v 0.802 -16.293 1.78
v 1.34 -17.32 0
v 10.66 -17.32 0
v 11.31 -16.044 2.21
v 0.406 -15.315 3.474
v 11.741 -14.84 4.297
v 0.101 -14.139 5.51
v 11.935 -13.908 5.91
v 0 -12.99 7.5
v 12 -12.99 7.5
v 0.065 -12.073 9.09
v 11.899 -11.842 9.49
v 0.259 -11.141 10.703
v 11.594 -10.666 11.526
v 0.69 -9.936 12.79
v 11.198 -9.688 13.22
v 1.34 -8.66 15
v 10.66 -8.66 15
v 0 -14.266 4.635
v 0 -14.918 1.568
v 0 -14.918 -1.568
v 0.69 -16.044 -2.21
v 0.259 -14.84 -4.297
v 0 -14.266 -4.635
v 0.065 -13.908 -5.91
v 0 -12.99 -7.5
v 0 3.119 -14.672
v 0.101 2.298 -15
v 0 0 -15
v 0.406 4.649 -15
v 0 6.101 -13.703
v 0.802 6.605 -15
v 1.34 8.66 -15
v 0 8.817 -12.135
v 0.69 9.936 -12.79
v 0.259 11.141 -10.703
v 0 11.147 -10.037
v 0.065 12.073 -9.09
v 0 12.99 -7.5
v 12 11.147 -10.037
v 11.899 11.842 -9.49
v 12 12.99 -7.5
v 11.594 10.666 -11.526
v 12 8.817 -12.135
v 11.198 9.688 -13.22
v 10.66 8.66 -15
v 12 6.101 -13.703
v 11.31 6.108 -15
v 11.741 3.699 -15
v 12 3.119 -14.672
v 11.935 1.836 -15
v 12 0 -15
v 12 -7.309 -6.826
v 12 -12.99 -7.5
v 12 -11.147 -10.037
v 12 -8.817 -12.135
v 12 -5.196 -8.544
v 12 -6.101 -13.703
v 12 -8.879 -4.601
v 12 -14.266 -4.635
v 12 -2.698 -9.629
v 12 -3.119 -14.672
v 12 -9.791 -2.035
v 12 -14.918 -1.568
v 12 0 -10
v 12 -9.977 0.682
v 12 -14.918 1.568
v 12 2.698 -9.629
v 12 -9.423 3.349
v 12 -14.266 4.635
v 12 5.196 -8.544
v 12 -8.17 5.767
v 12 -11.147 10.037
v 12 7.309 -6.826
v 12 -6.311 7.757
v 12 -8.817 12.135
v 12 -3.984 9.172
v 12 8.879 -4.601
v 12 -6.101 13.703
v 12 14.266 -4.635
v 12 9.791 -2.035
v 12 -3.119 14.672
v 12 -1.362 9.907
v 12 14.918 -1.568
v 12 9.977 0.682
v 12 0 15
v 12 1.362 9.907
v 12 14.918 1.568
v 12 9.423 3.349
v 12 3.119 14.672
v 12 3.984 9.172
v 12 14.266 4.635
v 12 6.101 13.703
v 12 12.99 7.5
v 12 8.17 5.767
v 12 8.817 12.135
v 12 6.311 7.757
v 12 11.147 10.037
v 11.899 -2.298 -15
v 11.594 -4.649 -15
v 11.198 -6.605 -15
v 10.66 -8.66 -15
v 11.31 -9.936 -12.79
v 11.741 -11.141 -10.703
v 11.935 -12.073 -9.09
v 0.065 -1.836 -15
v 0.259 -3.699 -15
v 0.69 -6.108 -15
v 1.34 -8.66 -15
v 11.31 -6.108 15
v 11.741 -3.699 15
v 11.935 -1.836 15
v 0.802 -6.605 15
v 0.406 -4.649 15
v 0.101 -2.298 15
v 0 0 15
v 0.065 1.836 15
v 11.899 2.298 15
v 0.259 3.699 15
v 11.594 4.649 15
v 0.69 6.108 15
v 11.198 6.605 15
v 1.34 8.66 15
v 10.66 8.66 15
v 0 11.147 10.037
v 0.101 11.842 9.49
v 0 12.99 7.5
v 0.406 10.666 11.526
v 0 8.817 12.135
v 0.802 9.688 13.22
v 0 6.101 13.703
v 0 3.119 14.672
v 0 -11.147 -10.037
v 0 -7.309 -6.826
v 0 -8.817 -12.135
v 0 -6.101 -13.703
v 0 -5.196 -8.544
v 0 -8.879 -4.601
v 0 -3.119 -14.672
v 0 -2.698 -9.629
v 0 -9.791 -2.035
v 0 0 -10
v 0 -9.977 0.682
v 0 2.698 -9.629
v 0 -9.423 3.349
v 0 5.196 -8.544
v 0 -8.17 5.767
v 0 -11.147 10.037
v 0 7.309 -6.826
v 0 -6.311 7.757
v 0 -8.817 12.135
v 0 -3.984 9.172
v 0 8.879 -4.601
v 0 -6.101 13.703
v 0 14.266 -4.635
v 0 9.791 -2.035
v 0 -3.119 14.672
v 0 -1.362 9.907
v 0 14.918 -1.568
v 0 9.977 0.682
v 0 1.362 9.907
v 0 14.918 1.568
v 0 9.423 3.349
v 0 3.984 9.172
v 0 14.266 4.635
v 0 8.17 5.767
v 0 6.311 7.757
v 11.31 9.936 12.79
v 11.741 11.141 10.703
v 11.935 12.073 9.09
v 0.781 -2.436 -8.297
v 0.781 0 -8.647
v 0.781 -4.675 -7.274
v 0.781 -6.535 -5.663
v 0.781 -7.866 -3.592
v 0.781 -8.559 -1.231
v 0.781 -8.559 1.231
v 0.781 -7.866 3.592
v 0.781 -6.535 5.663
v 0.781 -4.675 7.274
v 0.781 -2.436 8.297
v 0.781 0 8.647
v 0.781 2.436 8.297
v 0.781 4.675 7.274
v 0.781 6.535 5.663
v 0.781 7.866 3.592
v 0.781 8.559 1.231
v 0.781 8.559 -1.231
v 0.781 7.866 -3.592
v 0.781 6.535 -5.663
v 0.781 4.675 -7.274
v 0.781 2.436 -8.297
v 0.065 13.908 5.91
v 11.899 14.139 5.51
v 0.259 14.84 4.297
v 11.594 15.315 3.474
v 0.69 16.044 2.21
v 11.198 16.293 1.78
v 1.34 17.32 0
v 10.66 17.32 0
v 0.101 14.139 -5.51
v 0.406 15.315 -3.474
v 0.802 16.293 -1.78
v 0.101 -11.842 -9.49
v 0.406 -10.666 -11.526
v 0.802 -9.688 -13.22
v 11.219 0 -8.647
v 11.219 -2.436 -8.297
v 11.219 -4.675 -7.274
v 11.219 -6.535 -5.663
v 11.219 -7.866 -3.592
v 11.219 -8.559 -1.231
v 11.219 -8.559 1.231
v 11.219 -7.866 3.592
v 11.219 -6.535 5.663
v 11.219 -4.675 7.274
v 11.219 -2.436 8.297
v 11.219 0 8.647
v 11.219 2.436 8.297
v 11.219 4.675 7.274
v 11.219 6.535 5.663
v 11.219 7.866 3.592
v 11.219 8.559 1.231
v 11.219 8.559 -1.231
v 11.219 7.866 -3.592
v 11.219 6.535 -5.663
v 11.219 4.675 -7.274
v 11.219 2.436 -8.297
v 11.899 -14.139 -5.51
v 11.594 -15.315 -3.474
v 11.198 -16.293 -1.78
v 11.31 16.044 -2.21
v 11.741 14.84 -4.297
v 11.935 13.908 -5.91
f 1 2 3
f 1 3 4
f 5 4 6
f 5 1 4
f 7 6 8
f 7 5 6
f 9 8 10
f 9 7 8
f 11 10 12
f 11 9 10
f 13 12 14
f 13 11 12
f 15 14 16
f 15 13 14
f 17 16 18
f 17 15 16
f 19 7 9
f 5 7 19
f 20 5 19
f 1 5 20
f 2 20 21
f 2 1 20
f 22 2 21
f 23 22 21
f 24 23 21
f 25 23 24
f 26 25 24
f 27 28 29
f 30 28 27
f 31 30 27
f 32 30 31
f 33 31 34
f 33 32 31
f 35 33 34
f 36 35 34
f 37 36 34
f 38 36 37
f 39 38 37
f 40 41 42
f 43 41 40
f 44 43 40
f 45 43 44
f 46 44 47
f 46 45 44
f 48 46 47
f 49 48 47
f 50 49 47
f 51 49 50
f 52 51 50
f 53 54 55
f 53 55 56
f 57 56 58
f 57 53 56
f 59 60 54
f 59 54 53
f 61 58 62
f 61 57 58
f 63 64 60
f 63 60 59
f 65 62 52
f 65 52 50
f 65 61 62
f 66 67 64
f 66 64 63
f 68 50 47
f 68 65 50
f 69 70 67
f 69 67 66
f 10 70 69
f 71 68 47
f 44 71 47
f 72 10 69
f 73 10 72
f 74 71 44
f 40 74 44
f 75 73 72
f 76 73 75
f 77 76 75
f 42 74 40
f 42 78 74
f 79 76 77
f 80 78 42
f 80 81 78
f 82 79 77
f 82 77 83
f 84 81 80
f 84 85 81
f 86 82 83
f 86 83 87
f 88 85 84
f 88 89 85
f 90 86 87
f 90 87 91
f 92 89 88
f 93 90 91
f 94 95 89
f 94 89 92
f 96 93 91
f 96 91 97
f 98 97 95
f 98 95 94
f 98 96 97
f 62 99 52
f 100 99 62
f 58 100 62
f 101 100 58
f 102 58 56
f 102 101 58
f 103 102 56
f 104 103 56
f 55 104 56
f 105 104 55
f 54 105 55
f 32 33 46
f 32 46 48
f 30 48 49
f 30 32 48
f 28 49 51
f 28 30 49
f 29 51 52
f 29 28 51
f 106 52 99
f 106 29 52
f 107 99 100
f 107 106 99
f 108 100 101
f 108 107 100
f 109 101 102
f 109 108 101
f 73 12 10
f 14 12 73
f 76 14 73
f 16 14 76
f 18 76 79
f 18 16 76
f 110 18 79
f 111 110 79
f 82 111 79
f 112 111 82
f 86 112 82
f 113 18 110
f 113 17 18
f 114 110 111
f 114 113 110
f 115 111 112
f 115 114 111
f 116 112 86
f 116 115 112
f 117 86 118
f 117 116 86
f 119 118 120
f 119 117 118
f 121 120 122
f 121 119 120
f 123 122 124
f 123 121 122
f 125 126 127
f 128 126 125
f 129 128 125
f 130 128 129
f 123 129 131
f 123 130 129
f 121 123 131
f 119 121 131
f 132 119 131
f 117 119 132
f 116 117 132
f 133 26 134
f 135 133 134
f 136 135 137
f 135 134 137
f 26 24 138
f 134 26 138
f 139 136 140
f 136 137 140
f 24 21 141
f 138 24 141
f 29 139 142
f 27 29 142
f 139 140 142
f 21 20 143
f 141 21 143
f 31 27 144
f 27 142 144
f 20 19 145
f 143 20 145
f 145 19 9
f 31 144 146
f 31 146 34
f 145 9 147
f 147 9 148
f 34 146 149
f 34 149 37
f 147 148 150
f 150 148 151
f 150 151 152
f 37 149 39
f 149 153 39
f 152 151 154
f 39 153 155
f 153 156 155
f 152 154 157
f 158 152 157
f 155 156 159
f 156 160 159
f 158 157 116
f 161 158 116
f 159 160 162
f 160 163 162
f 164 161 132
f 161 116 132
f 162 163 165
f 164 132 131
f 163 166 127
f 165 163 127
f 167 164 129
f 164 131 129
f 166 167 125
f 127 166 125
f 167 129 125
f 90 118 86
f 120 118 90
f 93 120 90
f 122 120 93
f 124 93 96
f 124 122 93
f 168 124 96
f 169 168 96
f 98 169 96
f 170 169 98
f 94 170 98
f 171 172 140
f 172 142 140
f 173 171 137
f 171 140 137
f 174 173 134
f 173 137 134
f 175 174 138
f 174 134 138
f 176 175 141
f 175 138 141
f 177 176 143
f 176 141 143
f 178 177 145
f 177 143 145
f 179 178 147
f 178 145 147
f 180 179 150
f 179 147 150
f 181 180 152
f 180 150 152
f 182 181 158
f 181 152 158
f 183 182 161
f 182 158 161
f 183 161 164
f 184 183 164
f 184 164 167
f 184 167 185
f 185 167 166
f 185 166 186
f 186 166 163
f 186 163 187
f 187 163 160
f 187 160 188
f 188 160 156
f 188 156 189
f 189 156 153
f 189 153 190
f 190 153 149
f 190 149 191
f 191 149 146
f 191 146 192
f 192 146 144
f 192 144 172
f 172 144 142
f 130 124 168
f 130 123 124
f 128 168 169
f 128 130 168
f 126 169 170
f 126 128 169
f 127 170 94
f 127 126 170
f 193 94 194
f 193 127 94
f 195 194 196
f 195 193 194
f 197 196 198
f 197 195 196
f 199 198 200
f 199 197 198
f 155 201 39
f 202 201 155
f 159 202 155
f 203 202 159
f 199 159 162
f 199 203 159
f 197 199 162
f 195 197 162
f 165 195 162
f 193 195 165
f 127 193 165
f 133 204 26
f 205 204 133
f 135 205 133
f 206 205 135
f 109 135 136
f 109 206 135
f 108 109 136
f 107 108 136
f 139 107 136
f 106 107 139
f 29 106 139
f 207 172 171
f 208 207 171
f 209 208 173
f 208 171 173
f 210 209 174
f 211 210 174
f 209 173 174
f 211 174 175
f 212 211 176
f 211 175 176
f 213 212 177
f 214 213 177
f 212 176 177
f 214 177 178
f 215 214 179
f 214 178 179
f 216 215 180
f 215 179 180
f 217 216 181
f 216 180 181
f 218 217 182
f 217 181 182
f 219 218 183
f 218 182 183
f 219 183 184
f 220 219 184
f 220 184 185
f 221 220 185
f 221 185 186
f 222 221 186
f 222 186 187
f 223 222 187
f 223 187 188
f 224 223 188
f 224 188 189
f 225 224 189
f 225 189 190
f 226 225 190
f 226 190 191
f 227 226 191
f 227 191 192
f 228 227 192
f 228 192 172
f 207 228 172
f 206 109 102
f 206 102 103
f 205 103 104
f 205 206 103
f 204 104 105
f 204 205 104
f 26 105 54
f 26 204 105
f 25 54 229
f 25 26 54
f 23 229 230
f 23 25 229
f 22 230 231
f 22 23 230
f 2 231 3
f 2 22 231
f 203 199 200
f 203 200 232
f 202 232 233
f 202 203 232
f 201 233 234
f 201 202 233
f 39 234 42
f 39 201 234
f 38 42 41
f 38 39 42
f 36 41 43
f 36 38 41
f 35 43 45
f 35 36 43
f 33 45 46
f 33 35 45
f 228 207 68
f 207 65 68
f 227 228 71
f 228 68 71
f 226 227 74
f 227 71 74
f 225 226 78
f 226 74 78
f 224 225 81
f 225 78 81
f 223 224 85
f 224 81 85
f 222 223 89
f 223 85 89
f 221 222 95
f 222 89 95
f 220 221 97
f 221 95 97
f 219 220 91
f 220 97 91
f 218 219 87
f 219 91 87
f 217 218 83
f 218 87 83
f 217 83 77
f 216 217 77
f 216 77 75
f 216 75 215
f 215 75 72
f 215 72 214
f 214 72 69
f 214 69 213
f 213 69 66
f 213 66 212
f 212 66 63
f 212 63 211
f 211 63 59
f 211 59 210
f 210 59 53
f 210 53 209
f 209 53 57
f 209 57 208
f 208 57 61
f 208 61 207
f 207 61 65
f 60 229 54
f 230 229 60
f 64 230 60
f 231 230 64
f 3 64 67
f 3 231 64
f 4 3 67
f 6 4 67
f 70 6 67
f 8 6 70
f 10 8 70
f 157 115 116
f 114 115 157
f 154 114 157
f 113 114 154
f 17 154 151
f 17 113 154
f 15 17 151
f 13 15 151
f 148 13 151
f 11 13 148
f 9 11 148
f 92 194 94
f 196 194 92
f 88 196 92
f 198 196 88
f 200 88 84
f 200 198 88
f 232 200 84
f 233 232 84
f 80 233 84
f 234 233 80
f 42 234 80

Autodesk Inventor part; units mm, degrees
ref_plane "YZ Plane" through (0, 0, 0) normal (1, 0, 0) x (0, 1, 0)
ref_plane "XZ Plane" through (0, 0, 0) normal (0, 1, 0) x (-1, 0, 0)
sketch "草圖1" plane through (0, 0, 0) normal (1, 0, 0) x (0, 1, 0)
  line L0 (-17.3205, 0) -> (-8.6603, 15)
  line L1 (-8.6603, 15) -> (8.6603, 15)
  line L2 (8.6603, 15) -> (17.3205, 0)
  line L3 (17.3205, 0) -> (8.6603, -15)
  line L4 (8.6603, -15) -> (-8.6603, -15)
  line L5 (-8.6603, -15) -> (-17.3205, 0)
  point P0 (0, 0)
  point P1 (0, 0)
  dimension "d0" = 34.641
extrude "本體" add sketch "草圖1" along normal blind 12
sketch "草圖2" plane through (0, 0, 0) normal (0, 0, 1) x (1, 0, 0)
  line L0 (0, 8.6603) -> (0, 17.3205) projected
  line L1 (0, 17.3205) -> (12, 17.3205) projected
  line L2 (12, 8.6603) -> (12, 17.3205) projected
  line L3 (-2.4, 0) -> (14.4, 0) projected
  line L4 (1.3397, 17.3205) -> (0, 15)
  line L5 (10.6603, 17.3205) -> (12, 15)
  dimension "d3" = 30
  dimension "d4" = 30
  dimension "d5" = 30
  dimension "d6" = 30
revolve "倒角1" cut sketch "草圖2" angle 360 about axis through (-10, 0, 0) along (1, 0, 0)
sketch "草圖3" plane through (12, 0, 0) normal (1, 0, 0) x (0, 0, -1)
  arc A0 (-7.5, -12.9904) -> (7.5, -12.9904) centre (0, 0) ccw projected
hole "螺紋" at (12, 0, 0) direction (-1, 0, 0) diameter 17.294 end through all thread size "M20x2.5" class "6H" standard "ISO Metric profile"
chamfer "倒角2" distance 1.3532 angle 30 1 edges at (12, 0, 8.647) measured on face at (12, -12.8065, -0.3474)
chamfer "倒角3" distance 1.3532 angle 30 1 edges at (0, 0, 8.647) measured on face at (0, -12.8065, -0.3474)
ref_plane "Work Plane1" through (-35.3709, 0, 0) normal (0, -0.8660254, -0.5) x (1, 0, 0)
equation "\"d0\" = 1.1547 * SW"
equation "\"d1\" = KOH"
equation "\"d3\" = ANG1"
equation "\"d4\" = ANG2"
equation "\"d5\" = SW0"
equation "\"d6\" = SW01"
equation "\"d8\" = -0.5 * GD1 + 0.5 * NND"
equation "\"d40\" = -0.5 * GD1 + 0.5 * NND"
equation "\"d10\" = -0.5 * GD1 + 0.5 * NND"
equation "\"d41\" = -0.5 * GD1 + 0.5 * NND"
equation "\"ANG1\" = 30deg"
equation "\"ANG2\" = 30deg"
equation "\"KOH\" = 12"
equation "\"SW0\" = SW"
equation "\"SW01\" = SW"
equation "\"GUL\" = 0.541266 * PTC"
equation "\"TOA\" = 30deg"
equation "\"PTC\" = 2.5"
equation "\"E0\" = 1.155 * SW"
equation "\"GAL\" = 0.541266 * PTC"
equation "\"SW\" = 30"
equation "\"GD1\" = 17.293671"
equation "\"NND\" = 20"
properties part number "AS 1112 - M20" material "鋼、可鍛"
